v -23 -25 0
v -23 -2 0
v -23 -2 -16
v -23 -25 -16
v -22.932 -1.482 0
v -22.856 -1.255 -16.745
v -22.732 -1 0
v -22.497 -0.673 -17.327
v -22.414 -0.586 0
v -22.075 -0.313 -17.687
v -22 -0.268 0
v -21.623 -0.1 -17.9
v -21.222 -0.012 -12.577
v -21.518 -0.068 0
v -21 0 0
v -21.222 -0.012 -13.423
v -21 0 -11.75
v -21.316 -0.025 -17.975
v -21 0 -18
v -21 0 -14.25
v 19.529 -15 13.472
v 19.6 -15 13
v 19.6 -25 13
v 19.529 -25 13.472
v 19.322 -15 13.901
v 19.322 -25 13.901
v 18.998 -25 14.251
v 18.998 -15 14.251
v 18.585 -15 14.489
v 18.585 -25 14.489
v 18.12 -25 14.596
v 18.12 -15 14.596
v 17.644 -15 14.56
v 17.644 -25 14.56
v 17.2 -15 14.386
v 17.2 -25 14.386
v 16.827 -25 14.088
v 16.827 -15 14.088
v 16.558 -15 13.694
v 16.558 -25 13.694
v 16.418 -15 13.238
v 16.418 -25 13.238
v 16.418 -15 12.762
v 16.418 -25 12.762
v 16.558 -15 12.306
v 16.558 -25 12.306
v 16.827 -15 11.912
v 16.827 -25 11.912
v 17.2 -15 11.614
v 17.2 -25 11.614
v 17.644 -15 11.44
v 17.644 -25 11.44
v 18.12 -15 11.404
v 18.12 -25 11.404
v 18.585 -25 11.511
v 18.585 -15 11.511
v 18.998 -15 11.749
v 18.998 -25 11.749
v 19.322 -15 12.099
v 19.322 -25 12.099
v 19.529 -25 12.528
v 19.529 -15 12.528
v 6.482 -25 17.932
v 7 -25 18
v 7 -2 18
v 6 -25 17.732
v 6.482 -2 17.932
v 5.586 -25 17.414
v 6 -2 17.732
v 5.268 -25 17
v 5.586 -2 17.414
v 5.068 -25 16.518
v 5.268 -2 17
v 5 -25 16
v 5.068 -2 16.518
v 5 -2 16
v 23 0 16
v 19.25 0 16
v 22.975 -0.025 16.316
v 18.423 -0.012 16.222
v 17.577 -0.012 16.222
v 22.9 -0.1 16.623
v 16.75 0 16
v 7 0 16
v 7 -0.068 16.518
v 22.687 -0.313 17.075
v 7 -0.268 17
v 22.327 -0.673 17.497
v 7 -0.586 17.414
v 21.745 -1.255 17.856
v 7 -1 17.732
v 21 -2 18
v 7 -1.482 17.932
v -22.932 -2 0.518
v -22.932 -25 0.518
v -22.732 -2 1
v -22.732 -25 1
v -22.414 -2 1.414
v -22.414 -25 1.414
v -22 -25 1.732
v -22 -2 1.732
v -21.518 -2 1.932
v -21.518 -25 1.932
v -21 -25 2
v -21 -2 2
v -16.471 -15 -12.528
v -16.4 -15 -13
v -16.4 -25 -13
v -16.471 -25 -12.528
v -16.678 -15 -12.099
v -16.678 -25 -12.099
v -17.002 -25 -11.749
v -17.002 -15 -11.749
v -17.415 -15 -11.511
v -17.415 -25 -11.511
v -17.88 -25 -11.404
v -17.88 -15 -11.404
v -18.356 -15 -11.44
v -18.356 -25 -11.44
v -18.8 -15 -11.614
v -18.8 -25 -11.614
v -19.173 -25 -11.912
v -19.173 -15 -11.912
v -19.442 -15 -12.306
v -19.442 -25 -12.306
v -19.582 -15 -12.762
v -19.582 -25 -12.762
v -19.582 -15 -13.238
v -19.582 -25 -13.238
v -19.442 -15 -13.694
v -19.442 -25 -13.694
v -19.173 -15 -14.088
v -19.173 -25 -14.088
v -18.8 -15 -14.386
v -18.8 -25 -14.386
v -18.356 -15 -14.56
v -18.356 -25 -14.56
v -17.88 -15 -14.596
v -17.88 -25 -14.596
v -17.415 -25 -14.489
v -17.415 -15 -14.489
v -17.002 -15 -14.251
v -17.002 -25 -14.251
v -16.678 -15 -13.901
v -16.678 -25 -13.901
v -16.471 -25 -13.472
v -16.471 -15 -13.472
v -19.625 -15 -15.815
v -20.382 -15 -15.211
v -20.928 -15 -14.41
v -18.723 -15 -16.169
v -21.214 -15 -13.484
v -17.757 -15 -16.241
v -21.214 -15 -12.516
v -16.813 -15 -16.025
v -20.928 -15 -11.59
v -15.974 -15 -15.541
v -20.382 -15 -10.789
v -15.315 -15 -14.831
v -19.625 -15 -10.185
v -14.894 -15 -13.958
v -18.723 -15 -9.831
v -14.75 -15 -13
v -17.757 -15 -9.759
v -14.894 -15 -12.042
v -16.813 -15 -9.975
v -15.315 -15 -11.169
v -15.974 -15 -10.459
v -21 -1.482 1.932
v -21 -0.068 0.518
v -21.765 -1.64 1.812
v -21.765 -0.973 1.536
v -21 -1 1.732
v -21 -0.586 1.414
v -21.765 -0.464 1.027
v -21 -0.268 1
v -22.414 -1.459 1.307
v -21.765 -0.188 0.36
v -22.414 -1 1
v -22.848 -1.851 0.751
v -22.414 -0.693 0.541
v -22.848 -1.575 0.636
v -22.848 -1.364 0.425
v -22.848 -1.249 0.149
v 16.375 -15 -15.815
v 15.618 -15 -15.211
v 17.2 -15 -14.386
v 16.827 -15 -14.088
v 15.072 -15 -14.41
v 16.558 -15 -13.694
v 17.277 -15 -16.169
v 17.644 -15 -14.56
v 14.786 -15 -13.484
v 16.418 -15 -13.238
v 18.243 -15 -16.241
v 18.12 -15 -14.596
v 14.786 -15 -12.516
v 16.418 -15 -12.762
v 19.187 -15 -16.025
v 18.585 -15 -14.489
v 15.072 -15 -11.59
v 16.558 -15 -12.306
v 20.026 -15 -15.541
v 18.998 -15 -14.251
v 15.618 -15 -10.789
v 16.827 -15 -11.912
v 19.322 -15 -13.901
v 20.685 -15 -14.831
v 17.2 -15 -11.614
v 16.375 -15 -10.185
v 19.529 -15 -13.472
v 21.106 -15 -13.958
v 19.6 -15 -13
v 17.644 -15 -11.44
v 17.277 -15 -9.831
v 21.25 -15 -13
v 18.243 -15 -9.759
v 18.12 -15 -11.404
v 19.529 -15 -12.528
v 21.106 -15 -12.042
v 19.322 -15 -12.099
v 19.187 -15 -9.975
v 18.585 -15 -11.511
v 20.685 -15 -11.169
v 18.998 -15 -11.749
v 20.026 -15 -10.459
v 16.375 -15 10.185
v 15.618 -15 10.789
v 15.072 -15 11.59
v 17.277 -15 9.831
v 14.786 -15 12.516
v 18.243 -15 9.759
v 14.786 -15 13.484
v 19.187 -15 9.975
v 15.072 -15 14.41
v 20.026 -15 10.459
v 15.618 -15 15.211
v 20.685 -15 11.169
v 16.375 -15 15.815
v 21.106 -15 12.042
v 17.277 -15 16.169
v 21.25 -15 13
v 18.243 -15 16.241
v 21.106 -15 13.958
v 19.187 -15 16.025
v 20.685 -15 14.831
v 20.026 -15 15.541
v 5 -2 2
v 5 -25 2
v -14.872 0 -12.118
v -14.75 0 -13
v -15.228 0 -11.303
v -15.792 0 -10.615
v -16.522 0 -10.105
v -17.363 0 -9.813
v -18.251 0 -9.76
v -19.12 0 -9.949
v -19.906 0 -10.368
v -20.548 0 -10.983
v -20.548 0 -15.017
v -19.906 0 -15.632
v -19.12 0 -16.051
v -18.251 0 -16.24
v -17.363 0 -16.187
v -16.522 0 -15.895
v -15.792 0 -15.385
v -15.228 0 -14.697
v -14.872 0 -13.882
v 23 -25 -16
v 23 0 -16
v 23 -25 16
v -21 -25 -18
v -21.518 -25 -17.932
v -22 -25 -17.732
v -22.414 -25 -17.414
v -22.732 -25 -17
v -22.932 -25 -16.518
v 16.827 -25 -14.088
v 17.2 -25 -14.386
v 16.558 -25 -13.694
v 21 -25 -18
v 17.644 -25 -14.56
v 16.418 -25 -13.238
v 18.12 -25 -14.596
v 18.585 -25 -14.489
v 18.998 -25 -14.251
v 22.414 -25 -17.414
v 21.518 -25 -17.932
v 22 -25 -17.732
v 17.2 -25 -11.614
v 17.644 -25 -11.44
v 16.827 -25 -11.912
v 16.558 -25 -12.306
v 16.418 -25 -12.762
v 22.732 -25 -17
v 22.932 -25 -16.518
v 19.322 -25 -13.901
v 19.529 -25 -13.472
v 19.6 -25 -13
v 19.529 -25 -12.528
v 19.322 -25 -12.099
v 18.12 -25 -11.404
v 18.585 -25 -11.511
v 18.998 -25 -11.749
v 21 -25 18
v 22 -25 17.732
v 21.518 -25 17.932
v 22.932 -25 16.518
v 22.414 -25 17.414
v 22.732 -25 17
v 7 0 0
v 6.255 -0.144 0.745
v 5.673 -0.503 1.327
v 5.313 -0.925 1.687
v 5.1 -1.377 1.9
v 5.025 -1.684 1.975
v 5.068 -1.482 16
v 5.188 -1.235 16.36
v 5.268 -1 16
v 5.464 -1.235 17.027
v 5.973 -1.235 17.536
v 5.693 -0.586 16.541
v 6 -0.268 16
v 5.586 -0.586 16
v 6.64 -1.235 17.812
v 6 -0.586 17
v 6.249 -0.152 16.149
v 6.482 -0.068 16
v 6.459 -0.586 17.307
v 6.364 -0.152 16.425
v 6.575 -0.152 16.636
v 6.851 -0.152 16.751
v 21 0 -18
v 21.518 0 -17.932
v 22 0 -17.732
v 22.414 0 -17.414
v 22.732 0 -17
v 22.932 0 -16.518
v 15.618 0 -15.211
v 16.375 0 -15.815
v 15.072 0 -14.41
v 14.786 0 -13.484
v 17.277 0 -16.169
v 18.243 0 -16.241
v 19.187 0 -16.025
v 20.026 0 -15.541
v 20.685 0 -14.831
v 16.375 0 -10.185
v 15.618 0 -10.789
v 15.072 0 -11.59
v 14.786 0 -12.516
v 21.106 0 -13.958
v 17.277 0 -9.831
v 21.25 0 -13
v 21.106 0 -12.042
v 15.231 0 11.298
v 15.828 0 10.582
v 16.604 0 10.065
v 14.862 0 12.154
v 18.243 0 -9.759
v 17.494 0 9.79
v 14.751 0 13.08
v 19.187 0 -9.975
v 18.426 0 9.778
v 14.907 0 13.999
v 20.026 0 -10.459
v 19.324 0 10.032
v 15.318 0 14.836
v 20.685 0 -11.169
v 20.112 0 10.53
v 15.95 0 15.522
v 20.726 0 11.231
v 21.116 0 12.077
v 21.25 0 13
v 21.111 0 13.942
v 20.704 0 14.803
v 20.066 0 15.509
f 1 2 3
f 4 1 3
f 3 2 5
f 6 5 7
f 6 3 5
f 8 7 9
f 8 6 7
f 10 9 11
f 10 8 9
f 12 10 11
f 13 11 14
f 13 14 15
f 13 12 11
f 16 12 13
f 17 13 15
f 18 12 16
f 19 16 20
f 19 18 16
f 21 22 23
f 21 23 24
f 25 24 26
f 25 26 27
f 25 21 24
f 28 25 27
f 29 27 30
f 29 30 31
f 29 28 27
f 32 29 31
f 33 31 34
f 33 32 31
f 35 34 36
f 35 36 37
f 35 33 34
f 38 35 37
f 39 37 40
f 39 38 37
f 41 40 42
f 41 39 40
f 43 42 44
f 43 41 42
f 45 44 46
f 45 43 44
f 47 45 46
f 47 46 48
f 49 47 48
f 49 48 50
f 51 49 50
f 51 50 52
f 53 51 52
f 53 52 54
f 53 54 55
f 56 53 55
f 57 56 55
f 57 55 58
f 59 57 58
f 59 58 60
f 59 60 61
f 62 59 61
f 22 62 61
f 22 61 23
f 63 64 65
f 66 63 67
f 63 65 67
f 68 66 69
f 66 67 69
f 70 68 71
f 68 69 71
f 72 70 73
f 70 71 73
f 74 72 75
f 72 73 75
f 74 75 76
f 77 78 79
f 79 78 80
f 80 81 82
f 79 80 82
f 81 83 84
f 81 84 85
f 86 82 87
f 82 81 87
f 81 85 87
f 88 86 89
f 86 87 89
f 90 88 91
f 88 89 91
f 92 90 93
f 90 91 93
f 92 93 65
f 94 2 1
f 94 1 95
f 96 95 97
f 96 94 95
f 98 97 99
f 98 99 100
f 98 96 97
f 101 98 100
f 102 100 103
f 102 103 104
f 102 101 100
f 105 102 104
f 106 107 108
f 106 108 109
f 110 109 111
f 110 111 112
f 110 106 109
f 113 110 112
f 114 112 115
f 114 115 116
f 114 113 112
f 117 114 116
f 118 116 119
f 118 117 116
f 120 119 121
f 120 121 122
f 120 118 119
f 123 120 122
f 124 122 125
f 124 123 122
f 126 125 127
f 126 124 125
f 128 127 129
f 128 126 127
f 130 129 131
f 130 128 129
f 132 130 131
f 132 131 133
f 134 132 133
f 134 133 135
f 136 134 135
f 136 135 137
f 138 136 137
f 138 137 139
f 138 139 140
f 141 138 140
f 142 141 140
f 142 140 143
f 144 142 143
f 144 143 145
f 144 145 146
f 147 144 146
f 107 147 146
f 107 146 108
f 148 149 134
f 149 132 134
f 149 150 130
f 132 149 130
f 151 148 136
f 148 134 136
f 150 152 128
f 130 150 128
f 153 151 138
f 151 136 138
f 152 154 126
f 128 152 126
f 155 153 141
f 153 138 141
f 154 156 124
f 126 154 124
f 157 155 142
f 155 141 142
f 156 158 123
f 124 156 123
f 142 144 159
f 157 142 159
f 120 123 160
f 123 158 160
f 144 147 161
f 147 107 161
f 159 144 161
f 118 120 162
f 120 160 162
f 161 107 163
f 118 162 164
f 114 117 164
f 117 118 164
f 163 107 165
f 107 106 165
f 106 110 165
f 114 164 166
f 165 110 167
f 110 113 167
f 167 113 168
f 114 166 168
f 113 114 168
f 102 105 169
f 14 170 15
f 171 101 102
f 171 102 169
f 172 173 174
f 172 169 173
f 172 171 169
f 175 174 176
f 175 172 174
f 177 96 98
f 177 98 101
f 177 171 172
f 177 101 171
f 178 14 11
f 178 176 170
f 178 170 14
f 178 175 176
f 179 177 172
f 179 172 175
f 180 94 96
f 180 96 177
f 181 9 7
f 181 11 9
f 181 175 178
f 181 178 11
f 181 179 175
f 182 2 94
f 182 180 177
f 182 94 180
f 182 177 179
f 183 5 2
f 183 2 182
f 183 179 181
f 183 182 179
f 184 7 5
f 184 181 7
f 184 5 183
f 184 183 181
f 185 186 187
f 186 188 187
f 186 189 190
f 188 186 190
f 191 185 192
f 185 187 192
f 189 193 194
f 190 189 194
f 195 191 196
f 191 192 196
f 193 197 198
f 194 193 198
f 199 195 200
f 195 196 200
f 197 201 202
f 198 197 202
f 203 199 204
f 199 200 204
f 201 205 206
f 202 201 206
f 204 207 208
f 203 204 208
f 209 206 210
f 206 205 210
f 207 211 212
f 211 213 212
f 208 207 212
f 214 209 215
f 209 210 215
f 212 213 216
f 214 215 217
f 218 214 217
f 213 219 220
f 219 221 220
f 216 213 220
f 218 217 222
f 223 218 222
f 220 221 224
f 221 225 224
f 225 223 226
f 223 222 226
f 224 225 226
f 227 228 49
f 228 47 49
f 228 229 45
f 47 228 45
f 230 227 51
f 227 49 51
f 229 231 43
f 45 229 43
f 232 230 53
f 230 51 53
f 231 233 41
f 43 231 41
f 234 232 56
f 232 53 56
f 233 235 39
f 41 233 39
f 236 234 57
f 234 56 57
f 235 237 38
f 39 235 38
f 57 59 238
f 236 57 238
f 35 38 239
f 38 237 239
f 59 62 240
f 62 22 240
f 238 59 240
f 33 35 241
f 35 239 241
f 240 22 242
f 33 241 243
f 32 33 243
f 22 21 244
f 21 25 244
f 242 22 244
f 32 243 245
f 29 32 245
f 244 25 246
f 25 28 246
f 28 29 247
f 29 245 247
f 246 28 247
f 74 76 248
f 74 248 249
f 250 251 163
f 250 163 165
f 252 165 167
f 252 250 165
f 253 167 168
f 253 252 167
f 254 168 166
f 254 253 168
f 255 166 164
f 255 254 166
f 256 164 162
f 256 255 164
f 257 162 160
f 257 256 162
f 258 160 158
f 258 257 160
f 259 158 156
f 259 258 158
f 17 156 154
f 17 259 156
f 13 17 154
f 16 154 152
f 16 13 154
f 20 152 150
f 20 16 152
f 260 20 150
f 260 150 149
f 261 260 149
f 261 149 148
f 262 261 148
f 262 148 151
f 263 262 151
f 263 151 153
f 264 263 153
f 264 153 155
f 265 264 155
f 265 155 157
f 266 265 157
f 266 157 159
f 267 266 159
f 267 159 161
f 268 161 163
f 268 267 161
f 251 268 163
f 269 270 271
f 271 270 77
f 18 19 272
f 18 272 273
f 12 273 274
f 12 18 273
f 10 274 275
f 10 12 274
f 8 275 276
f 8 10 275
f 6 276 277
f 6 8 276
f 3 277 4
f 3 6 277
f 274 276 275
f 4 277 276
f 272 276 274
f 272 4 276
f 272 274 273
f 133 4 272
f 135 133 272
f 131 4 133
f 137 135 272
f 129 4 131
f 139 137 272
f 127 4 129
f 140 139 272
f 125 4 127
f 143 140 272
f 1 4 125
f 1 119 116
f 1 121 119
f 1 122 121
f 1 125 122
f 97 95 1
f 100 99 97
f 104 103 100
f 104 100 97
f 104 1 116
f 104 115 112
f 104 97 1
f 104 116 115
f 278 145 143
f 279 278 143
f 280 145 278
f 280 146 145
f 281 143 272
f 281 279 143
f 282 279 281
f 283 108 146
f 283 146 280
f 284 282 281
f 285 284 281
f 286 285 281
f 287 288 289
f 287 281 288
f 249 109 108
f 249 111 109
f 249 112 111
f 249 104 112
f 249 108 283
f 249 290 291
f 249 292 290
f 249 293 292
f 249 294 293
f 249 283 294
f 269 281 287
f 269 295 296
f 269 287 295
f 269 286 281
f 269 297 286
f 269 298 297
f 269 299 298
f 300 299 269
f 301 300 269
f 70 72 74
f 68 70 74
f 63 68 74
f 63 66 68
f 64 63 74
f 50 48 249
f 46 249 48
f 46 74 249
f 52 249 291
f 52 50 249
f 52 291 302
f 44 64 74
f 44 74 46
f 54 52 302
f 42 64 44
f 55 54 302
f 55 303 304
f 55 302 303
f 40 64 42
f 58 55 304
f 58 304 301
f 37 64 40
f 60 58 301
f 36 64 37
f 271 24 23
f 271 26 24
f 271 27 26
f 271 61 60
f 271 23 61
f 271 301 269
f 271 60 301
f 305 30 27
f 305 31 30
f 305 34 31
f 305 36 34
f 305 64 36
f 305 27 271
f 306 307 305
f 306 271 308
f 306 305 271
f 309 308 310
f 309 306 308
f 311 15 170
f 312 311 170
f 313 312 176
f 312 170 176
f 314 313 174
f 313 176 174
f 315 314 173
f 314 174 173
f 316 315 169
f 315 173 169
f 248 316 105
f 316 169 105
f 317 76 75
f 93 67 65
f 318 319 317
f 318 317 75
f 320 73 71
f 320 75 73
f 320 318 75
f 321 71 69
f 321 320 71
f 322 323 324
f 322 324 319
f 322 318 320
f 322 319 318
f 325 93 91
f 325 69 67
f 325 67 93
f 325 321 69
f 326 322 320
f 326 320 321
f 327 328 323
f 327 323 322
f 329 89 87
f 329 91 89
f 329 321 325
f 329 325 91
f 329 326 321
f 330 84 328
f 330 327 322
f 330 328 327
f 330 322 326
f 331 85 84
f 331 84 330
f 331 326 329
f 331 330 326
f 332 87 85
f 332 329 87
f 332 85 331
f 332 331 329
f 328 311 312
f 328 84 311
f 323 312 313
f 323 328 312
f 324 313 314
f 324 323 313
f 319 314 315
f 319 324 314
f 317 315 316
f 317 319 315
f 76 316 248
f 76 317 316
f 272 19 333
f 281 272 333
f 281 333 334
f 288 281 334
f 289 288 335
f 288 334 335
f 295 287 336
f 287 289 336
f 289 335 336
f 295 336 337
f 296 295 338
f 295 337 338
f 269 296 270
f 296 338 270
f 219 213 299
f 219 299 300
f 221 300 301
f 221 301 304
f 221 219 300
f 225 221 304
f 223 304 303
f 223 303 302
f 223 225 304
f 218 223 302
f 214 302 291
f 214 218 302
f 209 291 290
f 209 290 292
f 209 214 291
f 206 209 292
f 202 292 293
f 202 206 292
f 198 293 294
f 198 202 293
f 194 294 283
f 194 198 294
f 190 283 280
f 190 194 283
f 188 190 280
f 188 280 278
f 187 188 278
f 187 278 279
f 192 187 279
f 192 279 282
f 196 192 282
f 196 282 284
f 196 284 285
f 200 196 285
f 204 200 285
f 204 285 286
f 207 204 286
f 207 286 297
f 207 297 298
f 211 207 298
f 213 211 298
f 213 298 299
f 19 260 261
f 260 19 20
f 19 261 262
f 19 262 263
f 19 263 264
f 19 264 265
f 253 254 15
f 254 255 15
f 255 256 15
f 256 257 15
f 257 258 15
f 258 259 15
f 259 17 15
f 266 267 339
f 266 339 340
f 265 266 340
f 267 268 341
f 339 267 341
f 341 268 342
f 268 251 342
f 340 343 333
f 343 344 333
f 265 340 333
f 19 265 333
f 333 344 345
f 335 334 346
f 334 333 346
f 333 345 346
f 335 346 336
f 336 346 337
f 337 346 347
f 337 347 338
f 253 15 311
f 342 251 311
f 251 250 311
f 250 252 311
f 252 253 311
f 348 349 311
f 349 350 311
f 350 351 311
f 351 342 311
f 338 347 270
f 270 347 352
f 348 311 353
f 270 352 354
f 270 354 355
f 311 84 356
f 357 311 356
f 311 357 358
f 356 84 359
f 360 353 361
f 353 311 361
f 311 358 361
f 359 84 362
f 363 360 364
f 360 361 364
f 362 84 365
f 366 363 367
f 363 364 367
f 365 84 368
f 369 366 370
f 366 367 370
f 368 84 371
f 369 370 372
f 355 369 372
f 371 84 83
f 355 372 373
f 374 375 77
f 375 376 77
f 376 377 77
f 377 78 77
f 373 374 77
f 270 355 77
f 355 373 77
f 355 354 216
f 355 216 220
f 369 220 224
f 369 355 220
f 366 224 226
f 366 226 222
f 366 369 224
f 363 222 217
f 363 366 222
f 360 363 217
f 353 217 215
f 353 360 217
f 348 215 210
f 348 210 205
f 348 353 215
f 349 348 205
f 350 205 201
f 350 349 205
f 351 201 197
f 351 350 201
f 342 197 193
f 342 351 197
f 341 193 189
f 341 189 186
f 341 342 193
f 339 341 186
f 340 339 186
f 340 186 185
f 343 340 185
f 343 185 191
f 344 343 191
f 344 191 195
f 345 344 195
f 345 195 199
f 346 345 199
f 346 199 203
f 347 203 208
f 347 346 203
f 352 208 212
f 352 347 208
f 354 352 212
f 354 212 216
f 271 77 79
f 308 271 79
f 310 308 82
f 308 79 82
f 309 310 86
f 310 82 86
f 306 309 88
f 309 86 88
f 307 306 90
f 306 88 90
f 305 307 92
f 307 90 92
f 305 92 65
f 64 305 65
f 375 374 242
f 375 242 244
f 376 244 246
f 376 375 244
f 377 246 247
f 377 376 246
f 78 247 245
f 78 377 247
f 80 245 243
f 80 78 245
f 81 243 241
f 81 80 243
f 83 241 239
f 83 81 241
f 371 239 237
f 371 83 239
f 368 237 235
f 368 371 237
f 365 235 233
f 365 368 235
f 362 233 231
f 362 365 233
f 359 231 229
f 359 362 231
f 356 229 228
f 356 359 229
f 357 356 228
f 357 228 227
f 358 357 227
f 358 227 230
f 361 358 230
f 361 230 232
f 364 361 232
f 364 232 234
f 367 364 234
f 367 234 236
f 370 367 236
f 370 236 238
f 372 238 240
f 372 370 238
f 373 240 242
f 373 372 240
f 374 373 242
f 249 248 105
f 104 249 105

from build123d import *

# Parameters (mm, degrees)
F0_R         = 3.25
F0_R_2       = 1.6
F0_W         = 26
F0_H         = 2
F1_DEPTH     = 25
F2_DEPTH     = 15
F3_T1_DEPTH  = 23
F3_T3_DEPTH  = 21
F3_T5_DEPTH  = 28
F3_T7_DEPTH  = 35
F3_T9_DEPTH  = 26
F3_T11_DEPTH = 14
F3_S15_W     = 2
F3_S15_H     = 2
F3_T16_DEPTH = 2
F3_S21_W     = 2
F3_S21_H     = 2
F3_T22_DEPTH = 2
F3_T29_DEPTH = 31
F3_T33_DEPTH = 19


# Not quite as in the source:
# - a fillet or chamfer that OpenCascade refuses, or shapes differently, is made with other operations: its cross-section is extruded or revolved along the edge and cut away or added


with BuildPart() as f1:
    # F0 (on Front) → F1 (new body)
    with BuildSketch(Plane.XZ):
        Polygon((-23, 0), (-23, -18), (23, -18), (23, 18), (5, 18), (5, 2), (3, 2), (3, 0), align=None)
        with Locations((-18, -13)):
            Circle(F0_R, mode=Mode.SUBTRACT)
        with Locations((18, -13)):
            Circle(F0_R, mode=Mode.SUBTRACT)
        with Locations((18, 13)):
            Circle(F0_R, mode=Mode.SUBTRACT)
        with Locations((18, 13)):
            Circle(F0_R)
        with Locations((18, 13)):
            Circle(F0_R_2, mode=Mode.SUBTRACT)
        with Locations((18, -13)):
            Circle(F0_R)
        with Locations((18, -13)):
            Circle(F0_R_2, mode=Mode.SUBTRACT)
        with Locations((-18, -13)):
            Circle(F0_R)
        with Locations((-18, -13)):
            Circle(F0_R_2, mode=Mode.SUBTRACT)
        with Locations((-10, 1)):
            Rectangle(F0_W, F0_H)
    extrude(amount=F1_DEPTH)

    # F0 (on Front) → F2 (cut)
    with BuildSketch(Plane.XZ):
        with Locations((18, -13)):
            Circle(F0_R)
        with Locations((18, -13)):
            Circle(F0_R_2, mode=Mode.SUBTRACT)
        with Locations((-18, -13)):
            Circle(F0_R)
        with Locations((-18, -13)):
            Circle(F0_R_2, mode=Mode.SUBTRACT)
        with Locations((18, 13)):
            Circle(F0_R)
        with Locations((18, 13)):
            Circle(F0_R_2, mode=Mode.SUBTRACT)
    extrude(amount=F2_DEPTH, mode=Mode.SUBTRACT)

    # F3: fillet of radius 2 on 9 edges, made by hand

    # F3_s2 → F3_t1 (cut)
    with BuildSketch(Plane.XY.offset(-23)):
        with BuildLine():
            ThreePointArc((-23, -2), (-22.4142135624, -0.5857864376), (-21, 0))
            Line((-21, 0), (-23, 0))
            Line((-23, 0), (-23, -2))
        make_face()
    extrude(amount=F3_T1_DEPTH, mode=Mode.SUBTRACT)

    # F3_s4 → F3_t3 (cut)
    with BuildSketch(Plane.YZ.offset(7)):
        with BuildLine():
            ThreePointArc((0, 16), (-0.5857864376, 17.4142135624), (-2, 18))
            Line((-2, 18), (0, 18))
            Line((0, 18), (0, 16))
        make_face()
    extrude(amount=F3_T3_DEPTH, mode=Mode.SUBTRACT)

    # F3_s6 → F3_t5 (cut)
    with BuildSketch(Plane.XZ.offset(2)):
        with BuildLine():
            ThreePointArc((-23, 0), (-22.4142135624, 1.4142135624), (-21, 2))
            Line((-21, 2), (-23, 2))
            Line((-23, 2), (-23, 0))
        make_face()
        with BuildLine():
            ThreePointArc((7, 18), (5.5857864376, 17.4142135624), (5, 16))
            Line((5, 16), (5, 18))
            Line((5, 18), (7, 18))
        make_face()
    extrude(amount=F3_T5_DEPTH, mode=Mode.SUBTRACT)

    # F3_s8 → F3_t7 (cut)
    with BuildSketch(Plane.XZ.offset(-5)):
        with BuildLine():
            ThreePointArc((-21, -18), (-22.4142135624, -17.4142135624), (-23, -16))
            Line((-23, -16), (-23, -18))
            Line((-23, -18), (-21, -18))
        make_face()
        with BuildLine():
            ThreePointArc((21, -18), (22.4142135624, -17.4142135624), (23, -16))
            Line((23, -16), (23, -18))
            Line((23, -18), (21, -18))
        make_face()
        with BuildLine():
            ThreePointArc((23, 16), (22.4142135624, 17.4142135624), (21, 18))
            Line((21, 18), (23, 18))
            Line((23, 18), (23, 16))
        make_face()
    extrude(amount=F3_T7_DEPTH, mode=Mode.SUBTRACT)

    # F3_s10 → F3_t9 (cut)
    with BuildSketch(Plane.YZ.offset(-21)):
        with BuildLine():
            ThreePointArc((0, 0), (-0.5857864376, 1.4142135624), (-2, 2))
            Line((-2, 2), (0, 2))
            Line((0, 2), (0, 0))
        make_face()
    extrude(amount=F3_T9_DEPTH, mode=Mode.SUBTRACT)

    # F3_s12 → F3_t11 (cut)
    with BuildSketch(Plane.XY.offset(2)):
        with BuildLine():
            ThreePointArc((7, 0), (5.5857864376, -0.5857864376), (5, -2))
            Line((5, -2), (5, 0))
            Line((5, 0), (7, 0))
        make_face()
    extrude(amount=F3_T11_DEPTH, mode=Mode.SUBTRACT)


with BuildPart() as f3_tool14:
    # F3_s15 → F3_t16 (new body)
    with BuildSketch(Plane.YZ.offset(-21)):
        with Locations((-1, 1)):
            Rectangle(F3_S15_W, F3_S15_H)
    extrude(amount=-F3_T16_DEPTH)

    # F3_s17 → F3_t18 (revolve, cut)
    with BuildSketch(Plane(origin=(-21, -2, 0), x_dir=(0, -0.7071067812, -0.7071067812), z_dir=(0, 0.7071067812, -0.7071067812))):
        with BuildLine():
            ThreePointArc((0, -2), (2, 0), (0, 2))
            Line((0, 2), (0, -2))
        make_face()
    revolve(axis=Axis((-21, -2, 0), (-1, 0, 0)), mode=Mode.SUBTRACT)


with BuildPart() as f1_1:
    add(f1.part)

    # F3_t13: cut F3_tool14
    add(f3_tool14.part, mode=Mode.SUBTRACT)


with BuildPart() as f3_tool20:
    # F3_s21 → F3_t22 (new body)
    with BuildSketch(Plane.XZ.offset(2)):
        with Locations((6, 17)):
            Rectangle(F3_S21_W, F3_S21_H)
    extrude(amount=-F3_T22_DEPTH)

    # F3_s23 → F3_t24 (revolve, cut)
    with BuildSketch(Plane(origin=(7, -2, 16), x_dir=(0.7071067812, 0, -0.7071067812), z_dir=(0.7071067812, 0, 0.7071067812))):
        with BuildLine():
            ThreePointArc((0, -2), (2, 0), (0, 2))
            Line((0, 2), (0, -2))
        make_face()
    revolve(axis=Axis((7, -2, 16), (0, 1, 0)), mode=Mode.SUBTRACT)


with BuildPart() as f1_2:
    add(f1_1.part)

    # F3_t19: cut F3_tool20
    add(f3_tool20.part, mode=Mode.SUBTRACT)


with BuildPart() as f3_tool27:
    # F3_s28 → F3_t29 (new body)
    with BuildSketch(Plane.YZ.offset(10)):
        with BuildLine():
            ThreePointArc((0, 0), (-0.5857864376, 1.4142135624), (-2, 2))
            Line((-2, 2), (0, 2))
            Line((0, 2), (0, 0))
        make_face()
    extrude(amount=-F3_T29_DEPTH)

    split(bisect_by=Plane.YZ.offset(5), keep=Keep.TOP)


with BuildPart() as f3_tool31:
    # F3_s32 → F3_t33 (new body)
    with BuildSketch(Plane.XY.offset(16)):
        with BuildLine():
            ThreePointArc((7, 0), (5.5857864376, -0.5857864376), (5, -2))
            Line((5, -2), (5, 0))
            Line((5, 0), (7, 0))
        make_face()
    extrude(amount=-F3_T33_DEPTH)

    split(bisect_by=Plane.XY.offset(2), keep=Keep.BOTTOM)


with BuildPart() as f3_tool27_1:
    add(f3_tool27.part)

    # F3_t35: intersect F3_tool31
    add(f3_tool31.part, mode=Mode.INTERSECT)


with BuildPart() as f1_3:
    add(f1_2.part)

    # F3_t25: cut F3_tool27
    add(f3_tool27_1.part, mode=Mode.SUBTRACT)


solid = f1_3.part
